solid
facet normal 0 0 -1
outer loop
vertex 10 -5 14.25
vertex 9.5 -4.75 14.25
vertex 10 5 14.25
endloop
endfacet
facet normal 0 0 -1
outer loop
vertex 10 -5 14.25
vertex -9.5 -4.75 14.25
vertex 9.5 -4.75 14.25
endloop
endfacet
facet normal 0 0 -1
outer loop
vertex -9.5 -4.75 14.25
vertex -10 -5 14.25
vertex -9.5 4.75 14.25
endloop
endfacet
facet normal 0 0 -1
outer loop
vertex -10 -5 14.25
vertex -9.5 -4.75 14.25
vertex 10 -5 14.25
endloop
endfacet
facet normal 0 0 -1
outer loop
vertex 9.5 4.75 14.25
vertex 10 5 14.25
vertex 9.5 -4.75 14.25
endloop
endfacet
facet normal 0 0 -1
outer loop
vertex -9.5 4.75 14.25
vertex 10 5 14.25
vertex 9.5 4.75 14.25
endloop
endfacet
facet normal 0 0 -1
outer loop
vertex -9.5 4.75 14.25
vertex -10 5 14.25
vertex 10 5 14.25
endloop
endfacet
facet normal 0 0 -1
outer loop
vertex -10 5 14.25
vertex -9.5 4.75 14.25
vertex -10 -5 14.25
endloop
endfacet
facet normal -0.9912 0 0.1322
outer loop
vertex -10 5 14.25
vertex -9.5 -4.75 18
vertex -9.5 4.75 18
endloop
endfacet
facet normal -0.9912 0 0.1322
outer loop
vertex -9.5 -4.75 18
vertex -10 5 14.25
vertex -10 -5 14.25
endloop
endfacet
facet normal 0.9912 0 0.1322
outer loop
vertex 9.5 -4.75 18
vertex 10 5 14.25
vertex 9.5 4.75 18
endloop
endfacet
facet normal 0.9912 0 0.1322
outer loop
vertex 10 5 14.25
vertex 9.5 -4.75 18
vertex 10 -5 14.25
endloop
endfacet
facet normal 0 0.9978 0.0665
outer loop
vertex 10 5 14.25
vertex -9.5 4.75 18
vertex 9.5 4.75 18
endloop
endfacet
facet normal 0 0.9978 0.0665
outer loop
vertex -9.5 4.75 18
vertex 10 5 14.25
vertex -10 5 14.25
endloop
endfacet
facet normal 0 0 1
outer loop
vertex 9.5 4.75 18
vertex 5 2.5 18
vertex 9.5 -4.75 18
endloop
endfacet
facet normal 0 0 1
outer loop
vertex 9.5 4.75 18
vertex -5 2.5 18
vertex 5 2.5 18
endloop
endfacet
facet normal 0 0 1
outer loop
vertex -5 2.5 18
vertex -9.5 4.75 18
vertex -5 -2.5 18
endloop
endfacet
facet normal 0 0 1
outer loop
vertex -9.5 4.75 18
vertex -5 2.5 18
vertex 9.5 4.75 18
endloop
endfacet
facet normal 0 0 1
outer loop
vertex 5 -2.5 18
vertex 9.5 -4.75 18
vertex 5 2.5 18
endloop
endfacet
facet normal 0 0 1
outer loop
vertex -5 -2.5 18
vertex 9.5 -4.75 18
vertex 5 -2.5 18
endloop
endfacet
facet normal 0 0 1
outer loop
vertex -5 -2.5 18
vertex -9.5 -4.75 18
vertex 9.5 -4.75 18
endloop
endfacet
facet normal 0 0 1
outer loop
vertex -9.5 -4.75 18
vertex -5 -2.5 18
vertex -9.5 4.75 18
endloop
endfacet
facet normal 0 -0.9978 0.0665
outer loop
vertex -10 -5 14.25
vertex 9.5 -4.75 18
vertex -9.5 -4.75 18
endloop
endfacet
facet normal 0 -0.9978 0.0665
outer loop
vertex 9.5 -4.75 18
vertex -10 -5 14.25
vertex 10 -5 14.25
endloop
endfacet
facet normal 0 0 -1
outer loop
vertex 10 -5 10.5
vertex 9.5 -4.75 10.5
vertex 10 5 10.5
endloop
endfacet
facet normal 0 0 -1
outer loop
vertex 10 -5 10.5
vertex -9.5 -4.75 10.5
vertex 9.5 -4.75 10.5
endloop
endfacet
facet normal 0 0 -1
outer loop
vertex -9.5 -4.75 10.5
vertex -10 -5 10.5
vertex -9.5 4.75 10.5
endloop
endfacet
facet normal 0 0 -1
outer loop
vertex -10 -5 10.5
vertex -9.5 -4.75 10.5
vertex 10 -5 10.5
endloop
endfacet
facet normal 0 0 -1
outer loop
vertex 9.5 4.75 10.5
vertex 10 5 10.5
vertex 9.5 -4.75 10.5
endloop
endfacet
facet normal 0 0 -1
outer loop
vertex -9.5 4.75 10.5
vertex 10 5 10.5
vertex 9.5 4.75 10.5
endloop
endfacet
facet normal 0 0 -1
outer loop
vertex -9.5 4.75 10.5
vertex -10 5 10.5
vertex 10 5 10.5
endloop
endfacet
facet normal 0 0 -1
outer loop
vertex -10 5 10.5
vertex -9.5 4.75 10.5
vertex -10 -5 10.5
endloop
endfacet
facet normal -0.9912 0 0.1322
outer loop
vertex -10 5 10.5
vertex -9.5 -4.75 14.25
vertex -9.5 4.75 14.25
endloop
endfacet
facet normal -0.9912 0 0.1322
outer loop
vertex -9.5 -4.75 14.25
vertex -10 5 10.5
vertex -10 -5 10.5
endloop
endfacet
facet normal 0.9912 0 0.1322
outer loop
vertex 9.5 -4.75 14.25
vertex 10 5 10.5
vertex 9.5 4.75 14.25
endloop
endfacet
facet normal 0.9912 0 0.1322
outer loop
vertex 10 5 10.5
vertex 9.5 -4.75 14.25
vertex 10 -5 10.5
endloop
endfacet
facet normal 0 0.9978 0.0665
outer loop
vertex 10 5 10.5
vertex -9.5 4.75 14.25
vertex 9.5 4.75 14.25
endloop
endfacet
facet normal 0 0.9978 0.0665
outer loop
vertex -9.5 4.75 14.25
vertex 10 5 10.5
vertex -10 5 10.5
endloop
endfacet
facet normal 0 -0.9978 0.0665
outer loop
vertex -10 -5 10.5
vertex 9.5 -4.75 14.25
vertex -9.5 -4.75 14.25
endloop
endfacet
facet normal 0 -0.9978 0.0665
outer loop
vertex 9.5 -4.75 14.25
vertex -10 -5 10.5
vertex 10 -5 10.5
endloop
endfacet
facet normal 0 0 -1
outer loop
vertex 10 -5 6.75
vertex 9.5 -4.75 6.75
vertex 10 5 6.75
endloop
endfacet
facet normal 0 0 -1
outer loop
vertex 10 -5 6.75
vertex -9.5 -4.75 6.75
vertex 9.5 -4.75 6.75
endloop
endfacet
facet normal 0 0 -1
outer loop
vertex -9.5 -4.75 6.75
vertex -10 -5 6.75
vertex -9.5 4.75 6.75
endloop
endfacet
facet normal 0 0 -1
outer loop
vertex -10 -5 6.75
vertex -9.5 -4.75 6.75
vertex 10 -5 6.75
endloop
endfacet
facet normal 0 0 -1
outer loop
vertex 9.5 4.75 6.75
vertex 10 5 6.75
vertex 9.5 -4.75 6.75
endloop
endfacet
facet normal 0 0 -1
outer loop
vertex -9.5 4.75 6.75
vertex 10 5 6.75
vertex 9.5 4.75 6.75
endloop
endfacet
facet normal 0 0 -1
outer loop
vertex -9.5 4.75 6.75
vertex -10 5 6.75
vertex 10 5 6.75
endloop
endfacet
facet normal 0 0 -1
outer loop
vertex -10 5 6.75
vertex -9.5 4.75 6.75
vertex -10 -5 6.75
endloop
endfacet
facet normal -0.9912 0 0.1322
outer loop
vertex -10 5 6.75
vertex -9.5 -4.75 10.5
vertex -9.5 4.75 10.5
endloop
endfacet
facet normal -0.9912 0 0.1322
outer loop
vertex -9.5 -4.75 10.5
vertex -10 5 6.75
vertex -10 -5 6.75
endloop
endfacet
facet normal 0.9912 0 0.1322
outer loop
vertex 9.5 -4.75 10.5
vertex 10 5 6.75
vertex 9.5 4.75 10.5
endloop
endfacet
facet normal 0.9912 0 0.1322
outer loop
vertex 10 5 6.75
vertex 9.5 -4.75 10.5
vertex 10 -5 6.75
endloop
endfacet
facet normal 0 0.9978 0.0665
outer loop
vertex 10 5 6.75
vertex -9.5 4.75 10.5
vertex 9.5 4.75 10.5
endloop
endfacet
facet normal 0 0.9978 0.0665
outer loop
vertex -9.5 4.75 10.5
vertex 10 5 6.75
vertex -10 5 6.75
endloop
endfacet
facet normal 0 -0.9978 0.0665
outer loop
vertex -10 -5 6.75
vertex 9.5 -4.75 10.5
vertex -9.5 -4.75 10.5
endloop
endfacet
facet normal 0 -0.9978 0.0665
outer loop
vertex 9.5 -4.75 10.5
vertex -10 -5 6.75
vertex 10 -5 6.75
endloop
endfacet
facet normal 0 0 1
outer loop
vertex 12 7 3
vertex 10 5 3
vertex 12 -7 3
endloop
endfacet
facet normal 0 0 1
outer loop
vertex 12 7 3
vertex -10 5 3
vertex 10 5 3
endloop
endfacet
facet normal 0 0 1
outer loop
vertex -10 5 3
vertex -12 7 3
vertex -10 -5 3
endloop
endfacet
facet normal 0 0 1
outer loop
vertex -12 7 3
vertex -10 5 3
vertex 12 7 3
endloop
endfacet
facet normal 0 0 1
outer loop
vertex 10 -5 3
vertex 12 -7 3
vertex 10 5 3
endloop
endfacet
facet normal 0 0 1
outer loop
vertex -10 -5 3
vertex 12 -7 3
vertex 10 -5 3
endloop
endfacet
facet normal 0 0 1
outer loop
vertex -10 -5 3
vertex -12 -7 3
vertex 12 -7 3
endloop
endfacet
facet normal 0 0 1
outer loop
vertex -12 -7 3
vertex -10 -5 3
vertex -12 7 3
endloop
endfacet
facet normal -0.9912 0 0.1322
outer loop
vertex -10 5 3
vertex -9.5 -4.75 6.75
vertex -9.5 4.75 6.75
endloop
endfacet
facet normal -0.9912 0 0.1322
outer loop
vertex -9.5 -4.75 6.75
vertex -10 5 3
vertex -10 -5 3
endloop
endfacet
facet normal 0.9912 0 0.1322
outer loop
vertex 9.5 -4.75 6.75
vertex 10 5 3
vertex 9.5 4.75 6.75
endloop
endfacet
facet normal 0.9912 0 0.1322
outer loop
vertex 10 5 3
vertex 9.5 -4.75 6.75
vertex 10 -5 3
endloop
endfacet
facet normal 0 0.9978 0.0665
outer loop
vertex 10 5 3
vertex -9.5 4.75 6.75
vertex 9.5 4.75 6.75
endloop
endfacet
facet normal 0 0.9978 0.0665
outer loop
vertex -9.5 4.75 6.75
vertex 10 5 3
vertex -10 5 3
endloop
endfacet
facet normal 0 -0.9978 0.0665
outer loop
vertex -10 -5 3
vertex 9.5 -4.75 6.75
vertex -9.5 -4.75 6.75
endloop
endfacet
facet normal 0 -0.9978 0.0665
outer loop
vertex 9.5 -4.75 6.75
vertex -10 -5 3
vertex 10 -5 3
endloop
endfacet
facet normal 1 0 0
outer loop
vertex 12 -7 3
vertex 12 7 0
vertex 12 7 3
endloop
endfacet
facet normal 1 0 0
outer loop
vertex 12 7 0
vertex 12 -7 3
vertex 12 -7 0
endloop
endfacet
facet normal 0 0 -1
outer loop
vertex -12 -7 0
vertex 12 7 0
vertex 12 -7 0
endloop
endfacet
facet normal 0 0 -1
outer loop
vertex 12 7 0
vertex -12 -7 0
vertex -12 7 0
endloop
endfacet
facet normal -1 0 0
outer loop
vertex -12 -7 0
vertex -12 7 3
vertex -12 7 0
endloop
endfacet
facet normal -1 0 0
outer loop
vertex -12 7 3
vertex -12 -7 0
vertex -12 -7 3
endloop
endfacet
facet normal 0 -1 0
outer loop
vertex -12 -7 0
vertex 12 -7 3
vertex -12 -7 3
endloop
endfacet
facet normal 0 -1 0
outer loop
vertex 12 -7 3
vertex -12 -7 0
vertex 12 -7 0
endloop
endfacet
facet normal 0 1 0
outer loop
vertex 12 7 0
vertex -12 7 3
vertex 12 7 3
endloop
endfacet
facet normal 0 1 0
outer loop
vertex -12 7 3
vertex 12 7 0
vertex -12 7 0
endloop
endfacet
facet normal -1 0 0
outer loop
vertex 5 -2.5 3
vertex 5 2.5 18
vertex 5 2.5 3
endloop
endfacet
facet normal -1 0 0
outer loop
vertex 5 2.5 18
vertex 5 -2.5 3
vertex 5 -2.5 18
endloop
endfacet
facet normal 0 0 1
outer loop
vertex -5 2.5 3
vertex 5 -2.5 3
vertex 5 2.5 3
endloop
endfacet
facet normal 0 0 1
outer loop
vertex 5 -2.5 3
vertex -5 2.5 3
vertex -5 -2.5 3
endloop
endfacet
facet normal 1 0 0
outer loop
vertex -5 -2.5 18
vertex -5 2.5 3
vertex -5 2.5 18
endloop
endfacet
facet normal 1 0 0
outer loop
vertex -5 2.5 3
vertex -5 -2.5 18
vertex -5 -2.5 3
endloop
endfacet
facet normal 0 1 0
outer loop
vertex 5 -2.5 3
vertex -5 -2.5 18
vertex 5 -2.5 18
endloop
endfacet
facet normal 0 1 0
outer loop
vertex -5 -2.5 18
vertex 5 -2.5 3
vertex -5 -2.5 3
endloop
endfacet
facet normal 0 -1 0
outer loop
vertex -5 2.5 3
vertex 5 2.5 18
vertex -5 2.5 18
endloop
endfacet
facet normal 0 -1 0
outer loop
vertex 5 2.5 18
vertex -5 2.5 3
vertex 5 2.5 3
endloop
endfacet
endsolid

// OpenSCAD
/*[EndCap generator]*/

// Length of the inner insertion:
InnerLength = 15;
// Max X inner diameter for the rings:
InnerX = 20;
// Max Y inner diameter for the rings:
InnerY = 10;
// Ratio for the smaller ring dimensions (1 or less, 0.94 typical.):
RatioRingsInner=0.95;
// Number of rings:
Rings=4;
// Rings Ratio (1 or less, 0.98 typical.):
RingsRatio=1;
// CAP outer X:
CAPOuterX=24;
// CAP outer Y:
CAPOuterY=14;
// CAP height:
CAPHeight=3;
// Inner hole X dimension:
InnerHoleX=10;
// Inner hole Y dimension:
InnerHoleY=5;
// Inner hole height:
InnerHoleHeight=15;

module MakeRCap()
{
    translate([0,0,InnerLength+CAPHeight])
    rotate([180,0,0])
    difference()
    {
        union()
        {
            // Rings
            for(i=[0:Rings-1])
            {
                Ratio=1-((1-RingsRatio)*(Rings-i));
                RingHeight=InnerLength/Rings;
                translate([0,0,(i+1)*RingHeight])
                rotate([180,0,0])
                linear_extrude(height = RingHeight, scale=RatioRingsInner)
                    square([Ratio*InnerX,Ratio*InnerY],center=true);
            }
            // Cap
            translate([0,0,InnerLength+CAPHeight/2]) cube([CAPOuterX,CAPOuterY,CAPHeight],center=true);
        }
    // Hole
    translate([-InnerHoleX/2,-InnerHoleY/2,0]) cube([InnerHoleX,InnerHoleY, InnerHoleHeight]);
    }
}

// Main
MakeRCap();
